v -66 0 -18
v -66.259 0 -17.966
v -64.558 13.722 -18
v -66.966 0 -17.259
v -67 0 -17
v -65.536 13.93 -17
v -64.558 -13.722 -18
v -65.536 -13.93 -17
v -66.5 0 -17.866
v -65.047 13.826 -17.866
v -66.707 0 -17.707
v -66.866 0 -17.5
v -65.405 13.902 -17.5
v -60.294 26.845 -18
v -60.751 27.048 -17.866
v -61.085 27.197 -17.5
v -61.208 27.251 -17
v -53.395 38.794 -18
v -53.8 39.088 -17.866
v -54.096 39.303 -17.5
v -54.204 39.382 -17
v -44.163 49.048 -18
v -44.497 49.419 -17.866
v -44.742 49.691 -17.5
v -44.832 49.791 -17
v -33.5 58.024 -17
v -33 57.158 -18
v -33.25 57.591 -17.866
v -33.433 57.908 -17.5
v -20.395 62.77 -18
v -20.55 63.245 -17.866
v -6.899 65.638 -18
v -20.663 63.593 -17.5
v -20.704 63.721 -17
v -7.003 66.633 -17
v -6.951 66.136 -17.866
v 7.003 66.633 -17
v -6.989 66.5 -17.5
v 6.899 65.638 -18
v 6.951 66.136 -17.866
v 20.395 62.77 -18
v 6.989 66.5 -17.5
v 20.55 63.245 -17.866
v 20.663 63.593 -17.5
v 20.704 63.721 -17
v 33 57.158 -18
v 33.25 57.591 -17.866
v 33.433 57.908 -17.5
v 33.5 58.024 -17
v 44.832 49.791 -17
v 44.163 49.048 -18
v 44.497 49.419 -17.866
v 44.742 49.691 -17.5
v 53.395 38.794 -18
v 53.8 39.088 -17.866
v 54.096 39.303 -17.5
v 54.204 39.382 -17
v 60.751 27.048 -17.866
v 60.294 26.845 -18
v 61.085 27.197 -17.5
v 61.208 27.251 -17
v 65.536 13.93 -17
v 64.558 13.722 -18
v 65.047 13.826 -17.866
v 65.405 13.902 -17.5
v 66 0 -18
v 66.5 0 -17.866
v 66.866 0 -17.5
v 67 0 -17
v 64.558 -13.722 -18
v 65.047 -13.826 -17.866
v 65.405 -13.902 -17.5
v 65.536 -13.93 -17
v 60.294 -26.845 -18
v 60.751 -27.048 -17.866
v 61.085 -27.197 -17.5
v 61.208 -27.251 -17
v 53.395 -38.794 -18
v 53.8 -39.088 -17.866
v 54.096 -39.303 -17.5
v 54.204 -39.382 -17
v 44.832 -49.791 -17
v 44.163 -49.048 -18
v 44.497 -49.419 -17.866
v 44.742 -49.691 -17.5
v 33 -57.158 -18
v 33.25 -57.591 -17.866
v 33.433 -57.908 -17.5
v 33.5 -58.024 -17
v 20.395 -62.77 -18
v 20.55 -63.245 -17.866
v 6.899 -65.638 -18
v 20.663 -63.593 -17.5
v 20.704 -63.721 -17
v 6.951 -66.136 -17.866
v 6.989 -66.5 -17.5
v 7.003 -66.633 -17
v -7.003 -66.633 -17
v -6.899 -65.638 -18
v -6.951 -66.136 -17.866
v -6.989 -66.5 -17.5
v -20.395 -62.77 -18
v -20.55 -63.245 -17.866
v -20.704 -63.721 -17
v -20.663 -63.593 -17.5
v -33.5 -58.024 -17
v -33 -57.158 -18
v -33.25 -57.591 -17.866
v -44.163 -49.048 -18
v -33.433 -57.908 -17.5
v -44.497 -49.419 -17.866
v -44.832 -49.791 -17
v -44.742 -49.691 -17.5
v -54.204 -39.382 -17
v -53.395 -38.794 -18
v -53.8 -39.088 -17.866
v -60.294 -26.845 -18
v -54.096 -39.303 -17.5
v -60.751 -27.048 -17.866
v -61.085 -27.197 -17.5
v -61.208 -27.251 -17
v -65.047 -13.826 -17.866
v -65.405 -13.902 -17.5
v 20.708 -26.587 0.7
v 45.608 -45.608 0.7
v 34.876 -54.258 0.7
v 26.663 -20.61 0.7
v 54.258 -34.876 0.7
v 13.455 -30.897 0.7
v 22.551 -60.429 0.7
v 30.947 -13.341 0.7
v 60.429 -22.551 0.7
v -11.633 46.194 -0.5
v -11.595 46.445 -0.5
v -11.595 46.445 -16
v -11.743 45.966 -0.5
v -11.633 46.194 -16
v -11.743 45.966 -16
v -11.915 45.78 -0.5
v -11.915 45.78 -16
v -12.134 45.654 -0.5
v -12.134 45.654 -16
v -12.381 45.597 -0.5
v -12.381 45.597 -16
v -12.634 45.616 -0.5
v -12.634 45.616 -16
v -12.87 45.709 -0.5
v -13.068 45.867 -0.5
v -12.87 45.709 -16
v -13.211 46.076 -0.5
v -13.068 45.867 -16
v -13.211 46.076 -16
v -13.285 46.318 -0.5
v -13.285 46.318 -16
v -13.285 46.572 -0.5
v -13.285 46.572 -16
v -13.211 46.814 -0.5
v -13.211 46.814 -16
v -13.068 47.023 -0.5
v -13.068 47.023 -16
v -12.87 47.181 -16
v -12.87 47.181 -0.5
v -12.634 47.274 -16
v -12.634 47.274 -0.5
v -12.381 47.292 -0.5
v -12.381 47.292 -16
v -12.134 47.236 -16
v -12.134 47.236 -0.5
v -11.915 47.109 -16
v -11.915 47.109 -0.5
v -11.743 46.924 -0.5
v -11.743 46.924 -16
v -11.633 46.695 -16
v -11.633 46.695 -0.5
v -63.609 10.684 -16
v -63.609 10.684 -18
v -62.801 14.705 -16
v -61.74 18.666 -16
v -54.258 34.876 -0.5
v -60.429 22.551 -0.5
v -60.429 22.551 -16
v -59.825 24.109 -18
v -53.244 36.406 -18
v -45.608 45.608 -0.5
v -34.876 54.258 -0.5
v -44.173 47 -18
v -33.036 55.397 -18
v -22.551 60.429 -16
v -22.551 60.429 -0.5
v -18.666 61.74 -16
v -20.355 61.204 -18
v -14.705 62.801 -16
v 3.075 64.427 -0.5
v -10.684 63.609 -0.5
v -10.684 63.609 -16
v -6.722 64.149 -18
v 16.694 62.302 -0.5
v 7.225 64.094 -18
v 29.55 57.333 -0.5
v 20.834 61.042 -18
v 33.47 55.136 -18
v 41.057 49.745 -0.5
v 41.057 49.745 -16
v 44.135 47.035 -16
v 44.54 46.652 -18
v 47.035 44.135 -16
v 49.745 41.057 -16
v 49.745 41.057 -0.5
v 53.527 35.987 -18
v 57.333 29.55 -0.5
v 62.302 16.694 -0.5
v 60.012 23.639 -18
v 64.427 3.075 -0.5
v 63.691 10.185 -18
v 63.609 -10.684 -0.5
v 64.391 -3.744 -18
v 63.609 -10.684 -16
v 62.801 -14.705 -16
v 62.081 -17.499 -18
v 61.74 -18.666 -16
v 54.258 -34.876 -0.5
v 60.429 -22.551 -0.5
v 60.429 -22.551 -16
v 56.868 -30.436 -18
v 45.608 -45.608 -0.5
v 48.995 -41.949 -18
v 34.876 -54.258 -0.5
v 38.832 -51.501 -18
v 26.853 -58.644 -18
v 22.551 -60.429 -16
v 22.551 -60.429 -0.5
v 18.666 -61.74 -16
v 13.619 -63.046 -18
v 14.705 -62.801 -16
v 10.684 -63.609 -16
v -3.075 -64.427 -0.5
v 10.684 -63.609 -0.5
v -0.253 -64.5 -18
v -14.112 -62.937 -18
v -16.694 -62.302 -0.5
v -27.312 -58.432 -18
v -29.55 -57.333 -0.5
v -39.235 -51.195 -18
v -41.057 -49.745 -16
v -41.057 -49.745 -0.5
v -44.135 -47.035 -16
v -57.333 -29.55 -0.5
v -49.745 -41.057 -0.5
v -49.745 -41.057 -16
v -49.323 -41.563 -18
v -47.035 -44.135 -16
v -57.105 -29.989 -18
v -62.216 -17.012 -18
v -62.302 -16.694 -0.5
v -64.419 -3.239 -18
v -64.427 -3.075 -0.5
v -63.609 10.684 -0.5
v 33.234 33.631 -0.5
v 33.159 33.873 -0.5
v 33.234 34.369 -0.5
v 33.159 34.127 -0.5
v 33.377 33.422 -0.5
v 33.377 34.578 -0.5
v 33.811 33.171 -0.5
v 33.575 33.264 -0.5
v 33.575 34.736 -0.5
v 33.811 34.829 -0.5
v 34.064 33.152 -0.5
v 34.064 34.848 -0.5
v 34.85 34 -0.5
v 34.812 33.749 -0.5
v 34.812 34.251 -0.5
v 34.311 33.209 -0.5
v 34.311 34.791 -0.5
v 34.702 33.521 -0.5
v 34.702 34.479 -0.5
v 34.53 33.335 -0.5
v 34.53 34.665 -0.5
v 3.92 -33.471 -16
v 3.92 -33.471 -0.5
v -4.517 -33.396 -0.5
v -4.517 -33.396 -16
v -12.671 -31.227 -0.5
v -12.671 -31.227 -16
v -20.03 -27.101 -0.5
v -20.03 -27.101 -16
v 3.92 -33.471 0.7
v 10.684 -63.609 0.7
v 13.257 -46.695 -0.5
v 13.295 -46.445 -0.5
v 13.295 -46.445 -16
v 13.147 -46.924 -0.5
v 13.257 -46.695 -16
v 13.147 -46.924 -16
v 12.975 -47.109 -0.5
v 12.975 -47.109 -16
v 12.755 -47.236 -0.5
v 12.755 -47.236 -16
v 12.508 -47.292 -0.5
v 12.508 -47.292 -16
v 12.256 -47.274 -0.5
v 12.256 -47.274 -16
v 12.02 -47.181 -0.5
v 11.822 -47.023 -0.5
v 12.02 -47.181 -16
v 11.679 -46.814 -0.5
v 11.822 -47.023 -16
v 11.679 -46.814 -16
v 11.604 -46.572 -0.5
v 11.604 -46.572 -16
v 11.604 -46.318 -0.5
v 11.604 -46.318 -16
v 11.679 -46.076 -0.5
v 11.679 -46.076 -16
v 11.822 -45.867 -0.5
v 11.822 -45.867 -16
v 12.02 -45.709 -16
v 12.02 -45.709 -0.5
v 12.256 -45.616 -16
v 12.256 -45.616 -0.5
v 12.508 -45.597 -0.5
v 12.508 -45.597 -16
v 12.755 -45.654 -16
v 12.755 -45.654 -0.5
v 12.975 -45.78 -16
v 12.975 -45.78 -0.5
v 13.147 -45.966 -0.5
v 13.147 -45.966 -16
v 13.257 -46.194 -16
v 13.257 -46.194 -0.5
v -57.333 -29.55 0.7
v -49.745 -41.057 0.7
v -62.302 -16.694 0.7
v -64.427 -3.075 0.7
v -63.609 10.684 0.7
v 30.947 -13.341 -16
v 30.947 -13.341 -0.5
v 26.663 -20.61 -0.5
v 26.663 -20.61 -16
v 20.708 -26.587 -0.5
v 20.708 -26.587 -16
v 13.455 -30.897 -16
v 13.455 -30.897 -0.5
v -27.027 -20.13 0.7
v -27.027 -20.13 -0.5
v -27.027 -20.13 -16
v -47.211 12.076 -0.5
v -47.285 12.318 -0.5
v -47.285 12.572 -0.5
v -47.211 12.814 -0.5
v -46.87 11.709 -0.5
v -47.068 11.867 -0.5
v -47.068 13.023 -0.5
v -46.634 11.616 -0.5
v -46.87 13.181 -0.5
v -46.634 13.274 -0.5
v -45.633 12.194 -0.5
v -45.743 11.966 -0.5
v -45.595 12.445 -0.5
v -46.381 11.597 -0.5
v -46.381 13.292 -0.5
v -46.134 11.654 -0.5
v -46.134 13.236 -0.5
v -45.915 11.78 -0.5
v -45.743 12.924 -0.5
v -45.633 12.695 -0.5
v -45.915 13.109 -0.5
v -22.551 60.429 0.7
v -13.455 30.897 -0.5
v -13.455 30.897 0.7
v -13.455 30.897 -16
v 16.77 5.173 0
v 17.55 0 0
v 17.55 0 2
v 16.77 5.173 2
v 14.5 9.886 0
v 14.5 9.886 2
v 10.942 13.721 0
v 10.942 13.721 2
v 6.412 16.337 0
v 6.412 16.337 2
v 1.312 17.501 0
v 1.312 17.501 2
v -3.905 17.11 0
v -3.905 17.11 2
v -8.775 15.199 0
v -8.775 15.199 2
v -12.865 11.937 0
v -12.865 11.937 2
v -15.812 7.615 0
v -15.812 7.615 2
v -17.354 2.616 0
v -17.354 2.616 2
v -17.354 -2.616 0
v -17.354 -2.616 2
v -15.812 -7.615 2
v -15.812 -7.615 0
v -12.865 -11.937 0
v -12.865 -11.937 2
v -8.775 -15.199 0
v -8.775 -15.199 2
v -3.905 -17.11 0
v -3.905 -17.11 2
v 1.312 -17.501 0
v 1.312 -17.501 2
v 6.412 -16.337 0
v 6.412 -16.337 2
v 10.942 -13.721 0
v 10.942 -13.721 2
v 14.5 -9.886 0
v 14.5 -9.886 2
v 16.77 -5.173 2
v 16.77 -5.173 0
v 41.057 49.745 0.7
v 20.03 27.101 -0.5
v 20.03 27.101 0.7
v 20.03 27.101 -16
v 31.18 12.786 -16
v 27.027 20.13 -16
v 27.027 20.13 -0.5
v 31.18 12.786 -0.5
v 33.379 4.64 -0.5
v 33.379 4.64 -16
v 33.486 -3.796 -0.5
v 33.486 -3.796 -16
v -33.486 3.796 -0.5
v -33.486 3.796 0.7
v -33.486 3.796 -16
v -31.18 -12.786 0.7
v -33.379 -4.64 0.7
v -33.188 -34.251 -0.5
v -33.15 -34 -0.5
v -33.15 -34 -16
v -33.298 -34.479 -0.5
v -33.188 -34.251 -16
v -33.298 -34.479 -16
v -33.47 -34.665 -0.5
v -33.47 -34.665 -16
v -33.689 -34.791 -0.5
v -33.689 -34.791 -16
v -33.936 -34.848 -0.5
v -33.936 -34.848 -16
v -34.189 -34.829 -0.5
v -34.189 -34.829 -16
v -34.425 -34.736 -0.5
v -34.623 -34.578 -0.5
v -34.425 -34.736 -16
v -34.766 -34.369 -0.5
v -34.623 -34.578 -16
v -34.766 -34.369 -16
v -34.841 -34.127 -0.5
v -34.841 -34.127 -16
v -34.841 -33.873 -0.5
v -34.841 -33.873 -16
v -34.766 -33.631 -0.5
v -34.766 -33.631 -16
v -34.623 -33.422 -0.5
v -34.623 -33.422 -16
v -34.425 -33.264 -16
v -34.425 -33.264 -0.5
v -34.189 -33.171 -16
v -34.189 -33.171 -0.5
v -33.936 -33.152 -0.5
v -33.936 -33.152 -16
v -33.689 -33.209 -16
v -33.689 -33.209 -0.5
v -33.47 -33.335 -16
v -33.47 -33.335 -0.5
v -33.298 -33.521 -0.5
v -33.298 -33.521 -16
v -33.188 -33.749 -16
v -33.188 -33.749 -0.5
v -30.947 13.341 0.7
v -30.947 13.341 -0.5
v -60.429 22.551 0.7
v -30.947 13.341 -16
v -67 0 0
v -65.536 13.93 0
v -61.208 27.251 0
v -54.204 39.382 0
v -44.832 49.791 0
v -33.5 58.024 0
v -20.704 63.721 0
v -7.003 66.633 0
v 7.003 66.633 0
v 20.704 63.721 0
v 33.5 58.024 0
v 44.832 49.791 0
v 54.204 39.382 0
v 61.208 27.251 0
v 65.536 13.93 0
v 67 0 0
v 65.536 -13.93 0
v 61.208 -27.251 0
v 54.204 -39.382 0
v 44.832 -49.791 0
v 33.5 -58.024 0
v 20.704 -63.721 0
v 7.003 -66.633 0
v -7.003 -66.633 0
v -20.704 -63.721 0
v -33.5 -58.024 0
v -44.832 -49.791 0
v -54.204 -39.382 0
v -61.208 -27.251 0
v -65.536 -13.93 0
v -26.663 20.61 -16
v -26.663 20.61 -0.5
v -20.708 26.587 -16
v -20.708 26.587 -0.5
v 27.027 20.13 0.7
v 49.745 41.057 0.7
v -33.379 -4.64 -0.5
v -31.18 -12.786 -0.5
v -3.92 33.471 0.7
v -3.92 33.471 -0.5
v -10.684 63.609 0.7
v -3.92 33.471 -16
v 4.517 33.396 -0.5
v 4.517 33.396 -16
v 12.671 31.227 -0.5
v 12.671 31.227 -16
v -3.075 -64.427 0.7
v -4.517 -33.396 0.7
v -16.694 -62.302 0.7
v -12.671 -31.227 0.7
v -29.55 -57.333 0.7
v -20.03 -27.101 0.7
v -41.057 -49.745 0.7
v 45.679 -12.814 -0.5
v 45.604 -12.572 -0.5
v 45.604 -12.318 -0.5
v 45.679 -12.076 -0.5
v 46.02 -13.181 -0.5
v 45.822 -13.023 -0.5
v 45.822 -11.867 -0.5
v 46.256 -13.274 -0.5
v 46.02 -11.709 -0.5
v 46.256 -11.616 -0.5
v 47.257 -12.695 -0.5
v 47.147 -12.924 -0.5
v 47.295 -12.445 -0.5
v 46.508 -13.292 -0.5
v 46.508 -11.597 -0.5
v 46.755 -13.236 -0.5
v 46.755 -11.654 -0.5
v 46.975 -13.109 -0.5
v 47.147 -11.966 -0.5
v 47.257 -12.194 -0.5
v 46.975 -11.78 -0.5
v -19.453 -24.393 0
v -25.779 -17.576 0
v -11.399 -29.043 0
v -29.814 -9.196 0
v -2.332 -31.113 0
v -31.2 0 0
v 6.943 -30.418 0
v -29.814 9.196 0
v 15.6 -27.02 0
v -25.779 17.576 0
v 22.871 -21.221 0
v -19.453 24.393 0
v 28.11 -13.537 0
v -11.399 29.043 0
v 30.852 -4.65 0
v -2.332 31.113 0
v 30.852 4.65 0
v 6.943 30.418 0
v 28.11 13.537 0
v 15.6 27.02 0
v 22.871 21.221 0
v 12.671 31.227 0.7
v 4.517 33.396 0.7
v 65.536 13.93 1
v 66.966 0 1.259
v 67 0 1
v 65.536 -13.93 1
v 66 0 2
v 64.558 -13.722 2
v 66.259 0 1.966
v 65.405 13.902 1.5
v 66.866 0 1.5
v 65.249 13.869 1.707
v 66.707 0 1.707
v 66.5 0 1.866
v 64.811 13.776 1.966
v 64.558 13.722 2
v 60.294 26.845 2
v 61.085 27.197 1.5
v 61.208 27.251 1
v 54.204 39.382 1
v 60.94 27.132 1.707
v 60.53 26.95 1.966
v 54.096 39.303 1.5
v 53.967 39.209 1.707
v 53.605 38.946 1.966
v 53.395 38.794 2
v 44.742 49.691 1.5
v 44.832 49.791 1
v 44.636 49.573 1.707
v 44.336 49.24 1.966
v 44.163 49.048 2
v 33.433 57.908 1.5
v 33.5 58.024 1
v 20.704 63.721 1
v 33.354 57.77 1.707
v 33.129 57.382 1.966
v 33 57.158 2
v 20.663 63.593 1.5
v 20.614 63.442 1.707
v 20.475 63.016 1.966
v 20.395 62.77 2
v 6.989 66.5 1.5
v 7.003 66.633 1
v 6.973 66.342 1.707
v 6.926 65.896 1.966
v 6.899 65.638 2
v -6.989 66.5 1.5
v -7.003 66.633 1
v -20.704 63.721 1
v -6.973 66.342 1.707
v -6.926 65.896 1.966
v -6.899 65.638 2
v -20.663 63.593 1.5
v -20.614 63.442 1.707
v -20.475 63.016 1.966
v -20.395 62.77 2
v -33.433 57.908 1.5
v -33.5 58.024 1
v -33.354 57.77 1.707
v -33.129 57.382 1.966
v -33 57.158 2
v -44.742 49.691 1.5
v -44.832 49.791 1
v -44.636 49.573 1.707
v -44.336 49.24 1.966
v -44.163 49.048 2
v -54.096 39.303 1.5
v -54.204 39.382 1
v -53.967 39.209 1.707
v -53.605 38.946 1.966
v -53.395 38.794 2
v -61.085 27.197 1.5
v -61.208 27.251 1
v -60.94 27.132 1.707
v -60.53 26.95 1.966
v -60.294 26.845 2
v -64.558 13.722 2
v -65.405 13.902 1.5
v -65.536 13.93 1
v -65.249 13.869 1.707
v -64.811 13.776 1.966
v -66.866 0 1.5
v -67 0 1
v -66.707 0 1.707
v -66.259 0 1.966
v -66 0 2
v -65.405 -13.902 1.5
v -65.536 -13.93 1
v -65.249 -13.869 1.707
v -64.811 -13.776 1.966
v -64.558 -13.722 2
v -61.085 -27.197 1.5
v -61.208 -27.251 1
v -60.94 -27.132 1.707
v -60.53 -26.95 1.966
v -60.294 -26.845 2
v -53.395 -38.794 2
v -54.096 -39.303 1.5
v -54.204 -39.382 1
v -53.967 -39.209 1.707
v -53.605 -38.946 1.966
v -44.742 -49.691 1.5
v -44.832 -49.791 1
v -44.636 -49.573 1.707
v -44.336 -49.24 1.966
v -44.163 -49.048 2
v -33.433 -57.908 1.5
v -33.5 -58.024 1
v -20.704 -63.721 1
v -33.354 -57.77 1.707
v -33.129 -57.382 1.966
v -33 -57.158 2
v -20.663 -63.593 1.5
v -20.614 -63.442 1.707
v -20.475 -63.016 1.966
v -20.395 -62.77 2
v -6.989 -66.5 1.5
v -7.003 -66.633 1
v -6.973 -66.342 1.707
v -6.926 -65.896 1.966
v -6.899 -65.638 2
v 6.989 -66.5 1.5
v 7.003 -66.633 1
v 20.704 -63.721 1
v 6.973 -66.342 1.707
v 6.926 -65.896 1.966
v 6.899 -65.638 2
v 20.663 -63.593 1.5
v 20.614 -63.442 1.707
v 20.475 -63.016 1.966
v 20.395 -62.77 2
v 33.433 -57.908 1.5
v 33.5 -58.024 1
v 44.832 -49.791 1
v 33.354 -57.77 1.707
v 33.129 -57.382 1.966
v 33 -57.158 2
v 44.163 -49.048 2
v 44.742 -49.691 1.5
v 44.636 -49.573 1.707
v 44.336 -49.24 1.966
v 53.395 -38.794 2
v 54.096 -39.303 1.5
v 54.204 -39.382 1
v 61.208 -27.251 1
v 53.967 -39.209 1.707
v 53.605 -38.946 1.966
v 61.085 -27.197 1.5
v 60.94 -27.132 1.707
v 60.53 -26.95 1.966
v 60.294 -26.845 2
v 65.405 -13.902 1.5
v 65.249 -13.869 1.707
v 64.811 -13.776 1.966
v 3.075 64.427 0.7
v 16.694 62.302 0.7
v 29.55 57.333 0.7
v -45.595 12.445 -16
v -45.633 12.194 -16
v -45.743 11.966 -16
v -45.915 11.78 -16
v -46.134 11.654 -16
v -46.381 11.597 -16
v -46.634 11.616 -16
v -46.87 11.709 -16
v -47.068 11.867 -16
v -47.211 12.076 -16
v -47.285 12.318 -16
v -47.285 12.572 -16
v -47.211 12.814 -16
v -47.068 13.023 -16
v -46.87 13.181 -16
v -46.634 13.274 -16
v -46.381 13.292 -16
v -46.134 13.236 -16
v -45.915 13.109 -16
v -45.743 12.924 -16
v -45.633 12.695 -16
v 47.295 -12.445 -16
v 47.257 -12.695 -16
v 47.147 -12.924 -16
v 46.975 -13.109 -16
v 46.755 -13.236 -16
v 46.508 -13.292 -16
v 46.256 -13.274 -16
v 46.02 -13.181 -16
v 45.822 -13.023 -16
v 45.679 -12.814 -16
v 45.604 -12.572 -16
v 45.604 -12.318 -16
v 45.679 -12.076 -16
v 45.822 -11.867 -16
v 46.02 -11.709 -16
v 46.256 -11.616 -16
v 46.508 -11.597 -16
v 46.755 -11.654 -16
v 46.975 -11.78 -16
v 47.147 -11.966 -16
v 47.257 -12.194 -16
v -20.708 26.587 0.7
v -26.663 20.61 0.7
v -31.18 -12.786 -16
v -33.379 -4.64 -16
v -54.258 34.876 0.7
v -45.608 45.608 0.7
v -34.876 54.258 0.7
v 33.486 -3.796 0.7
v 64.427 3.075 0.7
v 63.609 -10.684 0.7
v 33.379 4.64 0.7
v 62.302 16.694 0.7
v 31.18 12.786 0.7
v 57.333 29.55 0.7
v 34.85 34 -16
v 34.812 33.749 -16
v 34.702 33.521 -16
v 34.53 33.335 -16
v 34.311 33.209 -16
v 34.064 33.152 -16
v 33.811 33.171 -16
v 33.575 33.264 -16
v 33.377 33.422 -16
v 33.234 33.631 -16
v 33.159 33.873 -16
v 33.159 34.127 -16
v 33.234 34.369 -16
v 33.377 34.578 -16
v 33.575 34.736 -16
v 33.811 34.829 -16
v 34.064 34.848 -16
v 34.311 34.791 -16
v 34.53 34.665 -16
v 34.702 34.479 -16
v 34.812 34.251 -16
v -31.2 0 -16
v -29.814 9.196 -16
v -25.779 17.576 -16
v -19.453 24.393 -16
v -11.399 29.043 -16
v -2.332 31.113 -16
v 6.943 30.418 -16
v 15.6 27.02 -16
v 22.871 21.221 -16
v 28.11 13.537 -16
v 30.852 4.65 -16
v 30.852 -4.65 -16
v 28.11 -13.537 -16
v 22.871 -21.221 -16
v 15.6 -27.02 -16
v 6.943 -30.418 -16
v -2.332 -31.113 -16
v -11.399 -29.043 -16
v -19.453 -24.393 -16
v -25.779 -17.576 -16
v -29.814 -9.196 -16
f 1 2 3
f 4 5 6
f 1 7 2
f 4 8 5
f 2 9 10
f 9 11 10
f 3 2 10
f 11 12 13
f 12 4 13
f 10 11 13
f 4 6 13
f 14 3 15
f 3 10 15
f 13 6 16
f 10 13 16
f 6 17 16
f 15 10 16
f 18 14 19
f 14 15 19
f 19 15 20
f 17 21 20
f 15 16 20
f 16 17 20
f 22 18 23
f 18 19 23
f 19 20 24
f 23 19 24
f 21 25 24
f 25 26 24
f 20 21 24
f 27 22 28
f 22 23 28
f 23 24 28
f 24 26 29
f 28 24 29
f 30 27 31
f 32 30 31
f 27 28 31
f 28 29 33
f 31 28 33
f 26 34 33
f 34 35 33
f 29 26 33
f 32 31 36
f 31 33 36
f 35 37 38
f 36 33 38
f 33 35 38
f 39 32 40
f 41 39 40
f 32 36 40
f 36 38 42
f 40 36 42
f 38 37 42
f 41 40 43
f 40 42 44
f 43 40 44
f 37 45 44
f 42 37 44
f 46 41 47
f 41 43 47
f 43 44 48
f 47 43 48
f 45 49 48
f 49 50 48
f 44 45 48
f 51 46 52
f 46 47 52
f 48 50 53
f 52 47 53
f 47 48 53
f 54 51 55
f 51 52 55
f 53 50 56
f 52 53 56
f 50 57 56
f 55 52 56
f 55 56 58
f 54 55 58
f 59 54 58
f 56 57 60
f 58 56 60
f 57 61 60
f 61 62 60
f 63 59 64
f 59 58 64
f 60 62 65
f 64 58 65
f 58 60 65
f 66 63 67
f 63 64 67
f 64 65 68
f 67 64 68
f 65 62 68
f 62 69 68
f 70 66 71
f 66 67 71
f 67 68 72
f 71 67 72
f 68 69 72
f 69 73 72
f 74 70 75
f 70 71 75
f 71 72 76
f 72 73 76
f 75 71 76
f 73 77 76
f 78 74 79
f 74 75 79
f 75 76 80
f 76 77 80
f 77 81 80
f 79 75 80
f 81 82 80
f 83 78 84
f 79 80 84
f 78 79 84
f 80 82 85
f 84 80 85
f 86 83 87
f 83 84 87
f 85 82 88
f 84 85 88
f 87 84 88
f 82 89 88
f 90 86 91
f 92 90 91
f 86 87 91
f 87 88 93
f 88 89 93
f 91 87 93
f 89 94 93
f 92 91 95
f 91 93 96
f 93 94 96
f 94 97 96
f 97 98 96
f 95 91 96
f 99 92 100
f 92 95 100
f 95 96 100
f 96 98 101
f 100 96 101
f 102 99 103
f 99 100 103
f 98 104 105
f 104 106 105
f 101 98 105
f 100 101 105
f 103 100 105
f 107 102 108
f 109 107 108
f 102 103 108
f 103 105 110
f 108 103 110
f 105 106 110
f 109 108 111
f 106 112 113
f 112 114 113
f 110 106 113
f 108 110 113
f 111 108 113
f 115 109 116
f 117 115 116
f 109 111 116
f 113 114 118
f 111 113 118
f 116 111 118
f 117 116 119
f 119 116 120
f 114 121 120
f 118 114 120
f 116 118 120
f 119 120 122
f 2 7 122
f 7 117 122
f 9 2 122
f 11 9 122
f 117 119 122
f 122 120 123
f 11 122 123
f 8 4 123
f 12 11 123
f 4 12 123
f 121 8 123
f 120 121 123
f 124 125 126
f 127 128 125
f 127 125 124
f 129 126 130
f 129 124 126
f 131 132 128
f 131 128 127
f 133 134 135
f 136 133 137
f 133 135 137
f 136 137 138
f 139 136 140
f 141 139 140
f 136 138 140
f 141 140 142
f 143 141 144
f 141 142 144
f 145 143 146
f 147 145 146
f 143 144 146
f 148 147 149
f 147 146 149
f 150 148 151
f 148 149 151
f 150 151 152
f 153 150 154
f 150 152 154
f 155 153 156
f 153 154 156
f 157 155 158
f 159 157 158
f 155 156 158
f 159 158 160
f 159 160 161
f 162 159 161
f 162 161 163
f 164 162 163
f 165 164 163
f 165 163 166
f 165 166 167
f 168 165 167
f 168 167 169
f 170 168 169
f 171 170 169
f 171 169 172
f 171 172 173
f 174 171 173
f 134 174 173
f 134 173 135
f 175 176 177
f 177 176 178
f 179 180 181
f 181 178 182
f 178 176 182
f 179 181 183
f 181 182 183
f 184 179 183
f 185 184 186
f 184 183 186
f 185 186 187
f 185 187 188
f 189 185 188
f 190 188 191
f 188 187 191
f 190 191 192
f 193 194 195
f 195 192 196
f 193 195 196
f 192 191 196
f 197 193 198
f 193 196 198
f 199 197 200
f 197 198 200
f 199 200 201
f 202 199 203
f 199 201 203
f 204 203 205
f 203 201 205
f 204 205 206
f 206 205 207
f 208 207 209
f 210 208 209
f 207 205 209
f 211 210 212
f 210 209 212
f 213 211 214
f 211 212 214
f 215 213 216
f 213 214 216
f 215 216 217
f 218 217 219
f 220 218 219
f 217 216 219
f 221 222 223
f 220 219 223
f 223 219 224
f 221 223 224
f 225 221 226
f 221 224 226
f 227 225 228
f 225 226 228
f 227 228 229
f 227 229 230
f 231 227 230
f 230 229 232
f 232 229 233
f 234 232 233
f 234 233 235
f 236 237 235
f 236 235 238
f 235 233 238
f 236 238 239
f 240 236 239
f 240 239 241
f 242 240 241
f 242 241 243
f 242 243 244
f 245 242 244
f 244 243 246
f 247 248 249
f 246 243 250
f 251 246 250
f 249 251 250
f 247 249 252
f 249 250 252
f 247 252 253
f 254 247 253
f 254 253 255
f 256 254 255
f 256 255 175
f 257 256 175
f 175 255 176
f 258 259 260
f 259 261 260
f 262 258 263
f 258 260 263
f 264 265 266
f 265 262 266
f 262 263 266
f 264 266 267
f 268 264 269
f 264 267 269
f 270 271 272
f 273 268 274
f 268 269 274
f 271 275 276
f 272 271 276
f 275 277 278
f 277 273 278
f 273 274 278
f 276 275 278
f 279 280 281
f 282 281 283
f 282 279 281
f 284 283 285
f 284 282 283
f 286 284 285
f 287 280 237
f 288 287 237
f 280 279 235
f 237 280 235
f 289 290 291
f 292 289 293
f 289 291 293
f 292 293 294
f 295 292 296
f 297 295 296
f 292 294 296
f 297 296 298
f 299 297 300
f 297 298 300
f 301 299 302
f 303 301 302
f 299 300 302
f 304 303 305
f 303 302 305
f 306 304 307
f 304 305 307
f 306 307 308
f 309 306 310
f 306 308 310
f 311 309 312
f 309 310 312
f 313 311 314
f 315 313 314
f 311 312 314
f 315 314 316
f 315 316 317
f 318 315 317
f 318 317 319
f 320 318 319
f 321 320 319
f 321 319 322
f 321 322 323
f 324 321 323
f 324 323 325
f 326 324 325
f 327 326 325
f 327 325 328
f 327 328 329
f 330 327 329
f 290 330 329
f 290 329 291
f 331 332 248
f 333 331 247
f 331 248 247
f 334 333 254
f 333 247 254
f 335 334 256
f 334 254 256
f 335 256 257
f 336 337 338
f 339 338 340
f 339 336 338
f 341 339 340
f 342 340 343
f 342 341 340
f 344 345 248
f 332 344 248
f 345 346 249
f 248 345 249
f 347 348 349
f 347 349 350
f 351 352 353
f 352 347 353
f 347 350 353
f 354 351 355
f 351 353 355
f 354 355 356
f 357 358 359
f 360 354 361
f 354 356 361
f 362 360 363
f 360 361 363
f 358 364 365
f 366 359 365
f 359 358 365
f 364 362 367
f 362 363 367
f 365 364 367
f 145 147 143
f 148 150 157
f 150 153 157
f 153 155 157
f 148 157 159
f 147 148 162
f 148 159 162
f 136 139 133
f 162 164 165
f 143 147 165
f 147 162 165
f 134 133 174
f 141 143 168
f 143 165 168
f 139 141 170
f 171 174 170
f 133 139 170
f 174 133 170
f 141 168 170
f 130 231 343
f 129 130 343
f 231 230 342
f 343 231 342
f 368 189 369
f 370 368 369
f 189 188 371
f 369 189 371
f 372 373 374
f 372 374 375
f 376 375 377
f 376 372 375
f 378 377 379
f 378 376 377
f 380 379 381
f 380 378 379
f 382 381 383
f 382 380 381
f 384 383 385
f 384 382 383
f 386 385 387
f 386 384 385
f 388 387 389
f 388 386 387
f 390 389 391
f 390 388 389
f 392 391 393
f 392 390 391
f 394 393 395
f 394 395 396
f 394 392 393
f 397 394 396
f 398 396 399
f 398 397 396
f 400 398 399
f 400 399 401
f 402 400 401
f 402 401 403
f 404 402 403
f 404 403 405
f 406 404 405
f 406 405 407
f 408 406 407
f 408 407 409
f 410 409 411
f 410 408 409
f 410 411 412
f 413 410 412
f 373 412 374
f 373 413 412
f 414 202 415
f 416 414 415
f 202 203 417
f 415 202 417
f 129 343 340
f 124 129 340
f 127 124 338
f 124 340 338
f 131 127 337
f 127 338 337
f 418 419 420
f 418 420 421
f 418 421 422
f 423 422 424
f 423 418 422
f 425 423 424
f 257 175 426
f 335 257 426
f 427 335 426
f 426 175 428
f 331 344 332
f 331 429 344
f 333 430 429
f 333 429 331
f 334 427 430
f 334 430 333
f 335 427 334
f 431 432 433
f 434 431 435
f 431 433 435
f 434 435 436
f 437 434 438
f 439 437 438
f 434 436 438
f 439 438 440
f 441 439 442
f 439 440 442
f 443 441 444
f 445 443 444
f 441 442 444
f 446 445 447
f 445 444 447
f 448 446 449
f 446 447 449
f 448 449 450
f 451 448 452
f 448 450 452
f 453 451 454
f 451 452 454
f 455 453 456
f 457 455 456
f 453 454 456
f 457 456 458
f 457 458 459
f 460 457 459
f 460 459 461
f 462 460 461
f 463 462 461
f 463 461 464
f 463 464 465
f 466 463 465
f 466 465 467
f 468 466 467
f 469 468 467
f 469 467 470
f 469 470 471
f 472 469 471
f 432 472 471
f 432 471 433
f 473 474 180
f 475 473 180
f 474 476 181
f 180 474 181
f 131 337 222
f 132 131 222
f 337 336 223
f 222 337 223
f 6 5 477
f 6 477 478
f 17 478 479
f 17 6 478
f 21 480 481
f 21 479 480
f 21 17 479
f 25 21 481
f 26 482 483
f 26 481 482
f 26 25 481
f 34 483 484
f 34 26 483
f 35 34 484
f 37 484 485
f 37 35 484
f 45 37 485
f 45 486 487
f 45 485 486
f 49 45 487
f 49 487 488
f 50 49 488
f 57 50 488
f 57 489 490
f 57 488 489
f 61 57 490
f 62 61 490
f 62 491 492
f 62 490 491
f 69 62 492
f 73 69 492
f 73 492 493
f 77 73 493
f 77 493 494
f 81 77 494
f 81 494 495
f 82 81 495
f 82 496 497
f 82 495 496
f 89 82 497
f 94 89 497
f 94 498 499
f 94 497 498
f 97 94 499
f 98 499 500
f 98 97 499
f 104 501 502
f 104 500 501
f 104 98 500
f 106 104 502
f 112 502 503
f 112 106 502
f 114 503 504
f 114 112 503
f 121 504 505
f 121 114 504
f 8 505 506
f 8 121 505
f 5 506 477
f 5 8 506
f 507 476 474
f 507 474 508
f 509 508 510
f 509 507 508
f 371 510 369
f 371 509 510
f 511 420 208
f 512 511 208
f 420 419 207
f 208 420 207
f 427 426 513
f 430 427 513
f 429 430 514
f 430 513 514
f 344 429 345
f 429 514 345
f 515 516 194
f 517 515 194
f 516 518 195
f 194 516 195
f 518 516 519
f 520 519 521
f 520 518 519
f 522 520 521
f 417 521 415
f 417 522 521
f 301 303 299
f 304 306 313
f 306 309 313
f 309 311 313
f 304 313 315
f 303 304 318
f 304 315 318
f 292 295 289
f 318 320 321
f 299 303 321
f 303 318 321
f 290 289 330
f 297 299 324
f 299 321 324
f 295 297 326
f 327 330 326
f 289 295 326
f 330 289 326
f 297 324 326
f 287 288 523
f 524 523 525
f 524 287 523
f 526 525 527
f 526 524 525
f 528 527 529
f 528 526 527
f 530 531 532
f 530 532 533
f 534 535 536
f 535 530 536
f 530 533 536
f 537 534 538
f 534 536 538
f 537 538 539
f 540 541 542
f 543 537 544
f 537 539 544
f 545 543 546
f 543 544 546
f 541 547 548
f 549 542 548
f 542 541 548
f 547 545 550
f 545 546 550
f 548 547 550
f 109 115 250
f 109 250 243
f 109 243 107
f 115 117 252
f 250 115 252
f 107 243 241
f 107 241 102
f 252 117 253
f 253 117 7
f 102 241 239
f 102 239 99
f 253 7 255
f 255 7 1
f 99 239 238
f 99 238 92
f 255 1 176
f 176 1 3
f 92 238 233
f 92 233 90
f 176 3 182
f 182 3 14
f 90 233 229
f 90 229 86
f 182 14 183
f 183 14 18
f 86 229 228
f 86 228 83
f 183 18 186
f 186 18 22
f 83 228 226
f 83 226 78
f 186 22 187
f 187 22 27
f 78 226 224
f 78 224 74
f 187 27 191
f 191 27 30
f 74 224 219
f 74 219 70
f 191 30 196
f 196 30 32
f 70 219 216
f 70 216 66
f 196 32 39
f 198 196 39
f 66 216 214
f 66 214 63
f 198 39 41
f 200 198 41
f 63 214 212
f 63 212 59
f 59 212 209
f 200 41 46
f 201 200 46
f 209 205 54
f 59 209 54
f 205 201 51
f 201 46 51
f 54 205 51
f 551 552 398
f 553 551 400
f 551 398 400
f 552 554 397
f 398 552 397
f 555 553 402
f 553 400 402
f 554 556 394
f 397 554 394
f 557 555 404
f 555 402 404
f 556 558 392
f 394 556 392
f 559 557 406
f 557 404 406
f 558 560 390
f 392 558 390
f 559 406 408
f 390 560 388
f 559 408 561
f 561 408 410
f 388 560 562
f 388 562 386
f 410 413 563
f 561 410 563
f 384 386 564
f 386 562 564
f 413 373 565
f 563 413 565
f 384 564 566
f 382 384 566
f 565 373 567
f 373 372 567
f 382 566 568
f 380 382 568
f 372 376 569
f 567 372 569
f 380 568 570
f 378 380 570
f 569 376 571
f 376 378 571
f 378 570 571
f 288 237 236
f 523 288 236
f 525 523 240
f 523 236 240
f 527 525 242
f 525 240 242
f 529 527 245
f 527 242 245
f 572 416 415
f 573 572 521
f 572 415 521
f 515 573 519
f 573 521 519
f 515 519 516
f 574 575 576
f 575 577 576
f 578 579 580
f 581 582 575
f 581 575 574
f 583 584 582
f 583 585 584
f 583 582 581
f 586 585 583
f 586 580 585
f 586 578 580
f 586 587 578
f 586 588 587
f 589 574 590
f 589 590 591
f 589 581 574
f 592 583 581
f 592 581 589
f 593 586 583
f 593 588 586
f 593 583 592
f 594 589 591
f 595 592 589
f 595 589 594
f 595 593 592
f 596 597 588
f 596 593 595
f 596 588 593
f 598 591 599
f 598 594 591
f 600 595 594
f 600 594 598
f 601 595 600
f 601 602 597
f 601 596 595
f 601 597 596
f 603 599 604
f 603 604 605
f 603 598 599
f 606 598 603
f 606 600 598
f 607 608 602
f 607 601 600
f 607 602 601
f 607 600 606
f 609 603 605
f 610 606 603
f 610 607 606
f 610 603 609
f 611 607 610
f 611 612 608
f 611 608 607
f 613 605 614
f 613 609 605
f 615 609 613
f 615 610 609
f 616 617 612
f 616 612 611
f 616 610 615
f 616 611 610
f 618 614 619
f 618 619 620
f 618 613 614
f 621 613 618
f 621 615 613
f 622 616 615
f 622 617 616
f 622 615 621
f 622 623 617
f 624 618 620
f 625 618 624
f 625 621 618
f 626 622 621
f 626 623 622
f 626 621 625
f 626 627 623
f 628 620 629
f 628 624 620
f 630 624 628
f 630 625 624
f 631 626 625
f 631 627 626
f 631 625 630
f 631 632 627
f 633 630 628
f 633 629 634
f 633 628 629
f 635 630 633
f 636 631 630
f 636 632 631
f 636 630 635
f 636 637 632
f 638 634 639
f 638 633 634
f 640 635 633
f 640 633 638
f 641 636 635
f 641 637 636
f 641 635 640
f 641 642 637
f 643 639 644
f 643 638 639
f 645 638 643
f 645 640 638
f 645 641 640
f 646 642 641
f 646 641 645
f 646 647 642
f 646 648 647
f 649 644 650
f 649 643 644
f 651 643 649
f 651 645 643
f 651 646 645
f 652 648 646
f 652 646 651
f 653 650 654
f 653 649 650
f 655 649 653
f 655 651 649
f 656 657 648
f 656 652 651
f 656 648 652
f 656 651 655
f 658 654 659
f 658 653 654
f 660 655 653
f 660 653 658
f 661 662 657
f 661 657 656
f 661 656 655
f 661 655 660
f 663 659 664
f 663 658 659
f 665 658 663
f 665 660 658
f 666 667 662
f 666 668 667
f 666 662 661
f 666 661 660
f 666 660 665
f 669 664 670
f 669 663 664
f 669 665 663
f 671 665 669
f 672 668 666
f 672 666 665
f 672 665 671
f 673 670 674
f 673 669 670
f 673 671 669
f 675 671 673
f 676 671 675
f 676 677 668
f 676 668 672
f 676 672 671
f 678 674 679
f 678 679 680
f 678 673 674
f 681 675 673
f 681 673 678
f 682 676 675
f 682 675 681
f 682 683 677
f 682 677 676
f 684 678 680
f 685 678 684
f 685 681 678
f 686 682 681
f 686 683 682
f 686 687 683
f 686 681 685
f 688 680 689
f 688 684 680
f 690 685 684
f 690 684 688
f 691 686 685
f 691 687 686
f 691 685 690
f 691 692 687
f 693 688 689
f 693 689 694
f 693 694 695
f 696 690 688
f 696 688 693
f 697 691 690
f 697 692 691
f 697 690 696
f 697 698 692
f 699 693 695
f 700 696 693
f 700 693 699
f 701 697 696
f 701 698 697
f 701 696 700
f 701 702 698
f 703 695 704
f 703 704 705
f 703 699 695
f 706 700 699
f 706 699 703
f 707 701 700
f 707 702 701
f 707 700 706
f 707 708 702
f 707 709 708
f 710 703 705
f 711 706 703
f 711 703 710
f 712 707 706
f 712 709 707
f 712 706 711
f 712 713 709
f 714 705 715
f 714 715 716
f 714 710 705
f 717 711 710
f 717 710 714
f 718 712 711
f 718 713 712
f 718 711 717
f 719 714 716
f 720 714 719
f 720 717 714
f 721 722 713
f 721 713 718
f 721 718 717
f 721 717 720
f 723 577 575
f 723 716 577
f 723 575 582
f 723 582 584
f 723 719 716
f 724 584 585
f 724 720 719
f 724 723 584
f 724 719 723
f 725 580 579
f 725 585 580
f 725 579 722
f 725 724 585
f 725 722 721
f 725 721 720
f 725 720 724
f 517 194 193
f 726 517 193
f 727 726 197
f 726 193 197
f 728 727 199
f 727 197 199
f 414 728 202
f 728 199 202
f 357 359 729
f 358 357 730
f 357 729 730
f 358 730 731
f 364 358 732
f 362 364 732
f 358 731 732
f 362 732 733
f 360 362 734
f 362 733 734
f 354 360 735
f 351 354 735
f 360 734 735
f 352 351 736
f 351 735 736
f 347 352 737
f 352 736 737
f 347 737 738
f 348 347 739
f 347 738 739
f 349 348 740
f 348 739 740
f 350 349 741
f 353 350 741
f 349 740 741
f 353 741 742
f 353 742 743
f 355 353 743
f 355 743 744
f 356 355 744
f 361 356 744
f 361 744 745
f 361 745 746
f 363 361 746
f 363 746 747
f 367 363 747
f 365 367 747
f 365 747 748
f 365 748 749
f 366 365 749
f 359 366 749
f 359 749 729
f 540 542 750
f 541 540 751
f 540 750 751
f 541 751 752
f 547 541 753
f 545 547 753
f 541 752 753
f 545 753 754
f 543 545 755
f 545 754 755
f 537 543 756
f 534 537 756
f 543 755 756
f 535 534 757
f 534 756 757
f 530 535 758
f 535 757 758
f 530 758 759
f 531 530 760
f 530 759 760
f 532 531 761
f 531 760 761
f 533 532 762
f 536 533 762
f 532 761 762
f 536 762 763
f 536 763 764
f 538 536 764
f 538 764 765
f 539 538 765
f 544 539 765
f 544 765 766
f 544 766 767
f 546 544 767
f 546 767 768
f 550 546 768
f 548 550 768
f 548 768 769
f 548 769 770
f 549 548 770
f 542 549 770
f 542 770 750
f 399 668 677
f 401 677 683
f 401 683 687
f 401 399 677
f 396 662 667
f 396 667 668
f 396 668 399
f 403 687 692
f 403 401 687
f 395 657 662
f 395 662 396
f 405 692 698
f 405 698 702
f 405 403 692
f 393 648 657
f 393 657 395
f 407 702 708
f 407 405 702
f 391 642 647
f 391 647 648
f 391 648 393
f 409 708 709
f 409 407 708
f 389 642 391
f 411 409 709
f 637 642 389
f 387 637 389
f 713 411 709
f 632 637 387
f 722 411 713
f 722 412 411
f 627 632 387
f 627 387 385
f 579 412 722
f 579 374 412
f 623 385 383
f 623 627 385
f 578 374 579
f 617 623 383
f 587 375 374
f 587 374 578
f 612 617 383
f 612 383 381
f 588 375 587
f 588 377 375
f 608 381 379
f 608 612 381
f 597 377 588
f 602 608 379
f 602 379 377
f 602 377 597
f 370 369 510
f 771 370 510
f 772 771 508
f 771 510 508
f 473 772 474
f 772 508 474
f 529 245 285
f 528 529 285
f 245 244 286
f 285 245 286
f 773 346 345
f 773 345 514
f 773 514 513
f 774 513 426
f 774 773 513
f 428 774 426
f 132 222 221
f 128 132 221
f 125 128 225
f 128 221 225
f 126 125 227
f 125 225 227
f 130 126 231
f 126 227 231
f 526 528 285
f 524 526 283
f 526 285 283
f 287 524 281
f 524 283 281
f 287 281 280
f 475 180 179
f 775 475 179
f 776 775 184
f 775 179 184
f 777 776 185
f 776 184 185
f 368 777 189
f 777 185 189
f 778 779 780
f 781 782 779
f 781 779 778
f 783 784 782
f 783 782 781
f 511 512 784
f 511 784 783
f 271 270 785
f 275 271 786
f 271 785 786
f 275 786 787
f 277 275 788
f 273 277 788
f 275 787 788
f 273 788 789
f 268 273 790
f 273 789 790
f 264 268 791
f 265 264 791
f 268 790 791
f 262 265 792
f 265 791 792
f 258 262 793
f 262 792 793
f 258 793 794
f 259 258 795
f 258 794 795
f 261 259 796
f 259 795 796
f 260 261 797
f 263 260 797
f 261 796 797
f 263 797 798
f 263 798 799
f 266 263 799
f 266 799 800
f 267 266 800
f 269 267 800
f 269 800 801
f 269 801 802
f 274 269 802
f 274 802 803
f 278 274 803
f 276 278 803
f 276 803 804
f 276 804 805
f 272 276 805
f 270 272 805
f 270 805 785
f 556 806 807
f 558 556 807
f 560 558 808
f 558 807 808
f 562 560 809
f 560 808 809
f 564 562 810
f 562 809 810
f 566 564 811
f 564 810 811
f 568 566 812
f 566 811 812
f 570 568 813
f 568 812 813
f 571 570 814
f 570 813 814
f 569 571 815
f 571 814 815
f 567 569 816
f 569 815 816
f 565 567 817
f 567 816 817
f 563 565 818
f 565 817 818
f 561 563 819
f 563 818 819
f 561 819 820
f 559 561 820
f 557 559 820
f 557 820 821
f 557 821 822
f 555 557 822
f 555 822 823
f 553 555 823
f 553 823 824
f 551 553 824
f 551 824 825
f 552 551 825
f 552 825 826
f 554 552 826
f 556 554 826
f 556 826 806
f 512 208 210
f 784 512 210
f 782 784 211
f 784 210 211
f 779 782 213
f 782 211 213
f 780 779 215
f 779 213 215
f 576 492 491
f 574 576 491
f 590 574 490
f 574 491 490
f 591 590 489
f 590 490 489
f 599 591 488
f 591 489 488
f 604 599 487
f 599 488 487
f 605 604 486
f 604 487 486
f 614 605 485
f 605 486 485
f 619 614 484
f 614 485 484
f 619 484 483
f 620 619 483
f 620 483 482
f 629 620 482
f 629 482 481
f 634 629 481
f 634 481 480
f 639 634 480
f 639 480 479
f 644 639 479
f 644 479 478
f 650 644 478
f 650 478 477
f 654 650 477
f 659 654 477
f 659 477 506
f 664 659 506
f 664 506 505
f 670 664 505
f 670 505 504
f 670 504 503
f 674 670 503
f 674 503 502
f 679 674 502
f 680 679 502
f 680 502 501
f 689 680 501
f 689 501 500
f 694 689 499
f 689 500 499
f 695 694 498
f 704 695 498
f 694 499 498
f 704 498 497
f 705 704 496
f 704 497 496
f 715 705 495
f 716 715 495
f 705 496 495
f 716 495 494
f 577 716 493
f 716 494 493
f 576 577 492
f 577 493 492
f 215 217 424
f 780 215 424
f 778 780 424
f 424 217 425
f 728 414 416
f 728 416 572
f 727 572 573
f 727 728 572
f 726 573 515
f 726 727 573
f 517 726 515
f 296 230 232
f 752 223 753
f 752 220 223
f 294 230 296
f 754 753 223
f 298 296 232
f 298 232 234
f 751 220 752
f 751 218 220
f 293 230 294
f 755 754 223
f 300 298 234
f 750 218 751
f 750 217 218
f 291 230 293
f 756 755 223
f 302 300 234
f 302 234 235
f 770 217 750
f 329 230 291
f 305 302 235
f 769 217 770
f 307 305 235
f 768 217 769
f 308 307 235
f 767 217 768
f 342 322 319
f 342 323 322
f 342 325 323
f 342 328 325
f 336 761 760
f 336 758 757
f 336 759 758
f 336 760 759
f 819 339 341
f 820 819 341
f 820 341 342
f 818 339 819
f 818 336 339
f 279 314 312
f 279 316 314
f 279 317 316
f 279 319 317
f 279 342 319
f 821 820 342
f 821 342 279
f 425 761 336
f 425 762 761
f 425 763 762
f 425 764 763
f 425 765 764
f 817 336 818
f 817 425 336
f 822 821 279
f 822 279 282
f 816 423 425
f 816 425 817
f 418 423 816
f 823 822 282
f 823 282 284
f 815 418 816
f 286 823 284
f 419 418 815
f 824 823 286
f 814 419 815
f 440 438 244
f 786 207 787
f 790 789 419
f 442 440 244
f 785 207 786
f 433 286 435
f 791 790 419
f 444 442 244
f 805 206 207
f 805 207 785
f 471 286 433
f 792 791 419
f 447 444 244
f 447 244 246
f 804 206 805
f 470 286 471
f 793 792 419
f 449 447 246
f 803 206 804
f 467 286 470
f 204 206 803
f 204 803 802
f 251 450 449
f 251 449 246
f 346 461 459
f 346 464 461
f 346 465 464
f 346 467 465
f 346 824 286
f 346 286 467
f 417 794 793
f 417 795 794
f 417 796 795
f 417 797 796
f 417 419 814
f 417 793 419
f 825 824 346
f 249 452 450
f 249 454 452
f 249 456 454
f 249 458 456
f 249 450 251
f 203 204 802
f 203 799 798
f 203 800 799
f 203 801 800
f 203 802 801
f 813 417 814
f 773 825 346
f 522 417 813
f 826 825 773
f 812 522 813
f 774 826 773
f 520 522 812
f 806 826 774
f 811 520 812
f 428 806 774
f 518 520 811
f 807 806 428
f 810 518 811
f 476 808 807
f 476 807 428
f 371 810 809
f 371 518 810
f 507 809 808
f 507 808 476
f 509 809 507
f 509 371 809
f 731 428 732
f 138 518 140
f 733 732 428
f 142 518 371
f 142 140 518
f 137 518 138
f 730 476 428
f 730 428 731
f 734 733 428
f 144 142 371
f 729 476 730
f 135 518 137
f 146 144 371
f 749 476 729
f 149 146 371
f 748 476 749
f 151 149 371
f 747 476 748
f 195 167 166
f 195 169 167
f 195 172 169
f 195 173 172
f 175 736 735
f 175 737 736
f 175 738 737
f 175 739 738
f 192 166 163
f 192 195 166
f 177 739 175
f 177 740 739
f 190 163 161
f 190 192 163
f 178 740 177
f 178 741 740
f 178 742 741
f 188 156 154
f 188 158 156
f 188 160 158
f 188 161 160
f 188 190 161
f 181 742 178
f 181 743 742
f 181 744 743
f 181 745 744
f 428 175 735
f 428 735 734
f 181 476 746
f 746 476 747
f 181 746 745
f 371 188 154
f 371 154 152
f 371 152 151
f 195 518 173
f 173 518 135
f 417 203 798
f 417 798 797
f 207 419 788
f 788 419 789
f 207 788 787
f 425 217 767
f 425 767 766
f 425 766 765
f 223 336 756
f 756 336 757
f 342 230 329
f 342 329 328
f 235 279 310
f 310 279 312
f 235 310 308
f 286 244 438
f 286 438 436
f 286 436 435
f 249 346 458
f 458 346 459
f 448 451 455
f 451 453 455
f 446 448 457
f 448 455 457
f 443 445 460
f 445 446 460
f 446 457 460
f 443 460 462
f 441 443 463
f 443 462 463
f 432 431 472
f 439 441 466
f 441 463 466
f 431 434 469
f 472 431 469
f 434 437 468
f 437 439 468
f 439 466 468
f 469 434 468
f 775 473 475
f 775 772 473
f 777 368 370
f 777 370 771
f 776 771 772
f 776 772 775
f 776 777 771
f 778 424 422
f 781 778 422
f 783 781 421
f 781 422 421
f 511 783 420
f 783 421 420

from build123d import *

# Parameters (mm, degrees)
SKETCH_1_R          = 67
SKETCH_1_R_2        = 17.55
EXTRUDE_1_DEPTH     = 2
EXTRUDE_START       = 18
SKETCH_2_R          = 67
SKETCH_2_R_2        = 31.2
EXTRUDE_2_DEPTH     = 18
FILLET_1_R          = 1
SHELL_4_T           = -2.5
SKETCH_4_R          = 0.85
EXTRUDE_3_DEPTH     = 18
FILLET_2_R          = 1
CUT_EXTRUDE_1_DEPTH = 1.2
SKETCH_6_R          = 64.5
CUT_EXTRUDE_2_DEPTH = 2


with BuildPart() as part:
    # 草图1 → 凸台-拉伸1 (new body)
    with BuildSketch(Plane.XY):
        Circle(SKETCH_1_R)
        Circle(SKETCH_1_R_2, mode=Mode.SUBTRACT)
    extrude(amount=EXTRUDE_1_DEPTH)

    # 草图2 → 凸台-拉伸2 (add)
    with BuildSketch(Plane(origin=(0, 0, 0), x_dir=(-1, 0, 0), z_dir=(0, 0, -1)).offset(EXTRUDE_START)):
        Circle(SKETCH_2_R)
        Circle(SKETCH_2_R_2, mode=Mode.SUBTRACT)
    extrude(amount=-EXTRUDE_2_DEPTH)

    # 圆角1
    fillet_1_edges = [part.edges().sort_by_distance(p)[0] for p in [
        (-67, 0, 2),
    ]]
    fillet(fillet_1_edges, radius=FILLET_1_R)

    # 抽壳4
    shell_4_openings = [part.faces().sort_by_distance(p)[0] for p in [
        (65.104953826, 0, -18),
    ]]
    offset(amount=SHELL_4_T, openings=shell_4_openings, kind=Kind.INTERSECTION)

    # 草图4 → 凸台-拉伸3 (add)
    # profile 1 of 6: a face of its own
    with BuildSketch(Plane(origin=(0, 0, 0), x_dir=(-1, 0, 0), z_dir=(0, 0, -1)).offset(EXTRUDE_START)):
        with BuildLine():
            Line((-41.05741952, 49.744731403), (-20.030225152, 27.101292964))
            ThreePointArc((-20.030225152, 27.101292964), (-23.785423834, 23.873491848), (-27.027081181, 20.130247958))
            Line((-27.027081181, 20.130247958), (-49.744731403, 41.05741952))
            ThreePointArc((-49.744731403, 41.05741952), (-45.608387387, 45.608387387), (-41.05741952, 49.744731403))
        make_face()
        with Locations(Location((-34, 34, 0), (0, 0, 180))):
            Circle(SKETCH_4_R, mode=Mode.SUBTRACT)
    # profile 2 of 6: a face of its own
    with BuildSketch(Plane(origin=(0, 0, 0), x_dir=(-1, 0, 0), z_dir=(0, 0, -1)).offset(EXTRUDE_START)):
        with BuildLine():
            Line((22.55149134, 60.42913402), (13.455295606, 30.897330308))
            ThreePointArc((13.455295606, 30.897330308), (8.782338501, 32.535527204), (3.919765525, 33.471262872))
            Line((3.919765525, 33.471262872), (10.684402617, 63.608910859))
            ThreePointArc((10.684402617, 63.608910859), (16.693828409, 62.302215796), (22.55149134, 60.42913402))
        make_face()
        with Locations(Location((12.444863729, 46.444863729, 0), (0, 0, 180))):
            Circle(SKETCH_4_R, mode=Mode.SUBTRACT)
    # profile 3 of 6: a face of its own
    with BuildSketch(Plane(origin=(0, 0, 0), x_dir=(-1, 0, 0), z_dir=(0, 0, -1)).offset(EXTRUDE_START)):
        with BuildLine():
            Line((63.608910859, 10.684402617), (33.485520759, 3.796037343))
            ThreePointArc((33.485520759, 3.796037343), (32.567762335, 8.662035356), (30.946846706, 13.341014914))
            Line((30.946846706, 13.341014914), (60.42913402, 22.55149134))
            ThreePointArc((60.42913402, 22.55149134), (62.302215796, 16.693828409), (63.608910859, 10.684402617))
        make_face()
        with Locations(Location((46.444863729, 12.444863729, 0), (0, 0, 180))):
            Circle(SKETCH_4_R, mode=Mode.SUBTRACT)
    # profile 4 of 6: a face of its own
    with BuildSketch(Plane(origin=(0, 0, 0), x_dir=(-1, 0, 0), z_dir=(0, 0, -1)).offset(EXTRUDE_START)):
        with BuildLine():
            Line((41.05741952, -49.744731403), (20.030225152, -27.101292964))
            ThreePointArc((20.030225152, -27.101292964), (23.785423834, -23.873491848), (27.027081181, -20.130247958))
            Line((27.027081181, -20.130247958), (49.744731403, -41.05741952))
            ThreePointArc((49.744731403, -41.05741952), (45.608387387, -45.608387387), (41.05741952, -49.744731403))
        make_face()
        with Locations(Location((34, -34, 0), (0, 0, 180))):
            Circle(SKETCH_4_R, mode=Mode.SUBTRACT)
    # profile 5 of 6: a face of its own
    with BuildSketch(Plane(origin=(0, 0, 0), x_dir=(-1, 0, 0), z_dir=(0, 0, -1)).offset(EXTRUDE_START)):
        with BuildLine():
            Line((-22.55149134, -60.42913402), (-13.455295606, -30.897330308))
            ThreePointArc((-13.455295606, -30.897330308), (-8.782338501, -32.535527204), (-3.919765525, -33.471262872))
            Line((-3.919765525, -33.471262872), (-10.684402617, -63.608910859))
            ThreePointArc((-10.684402617, -63.608910859), (-16.693828409, -62.302215796), (-22.55149134, -60.42913402))
        make_face()
        with Locations(Location((-12.444863729, -46.444863729, 0), (0, 0, 180))):
            Circle(SKETCH_4_R, mode=Mode.SUBTRACT)
    # profile 6 of 6: a face of its own
    with BuildSketch(Plane(origin=(0, 0, 0), x_dir=(-1, 0, 0), z_dir=(0, 0, -1)).offset(EXTRUDE_START)):
        with BuildLine():
            Line((-63.608910859, -10.684402617), (-33.485520759, -3.796037343))
            ThreePointArc((-33.485520759, -3.796037343), (-32.567762335, -8.662035356), (-30.946846706, -13.341014914))
            Line((-30.946846706, -13.341014914), (-60.42913402, -22.55149134))
            ThreePointArc((-60.42913402, -22.55149134), (-62.302215796, -16.693828409), (-63.608910859, -10.684402617))
        make_face()
        with Locations(Location((-46.444863729, -12.444863729, 0), (0, 0, 180))):
            Circle(SKETCH_4_R, mode=Mode.SUBTRACT)
    extrude(amount=-EXTRUDE_3_DEPTH)

    # 圆角2
    fillet_2_edges = [part.edges().sort_by_distance(p)[0] for p in [
        (67, 0, -18),
    ]]
    fillet(fillet_2_edges, radius=FILLET_2_R)

    # 草图5 → 切除-拉伸1 (cut)
    with BuildSketch(Plane(origin=(0, 0, -0.5), x_dir=(-1, 0, 0), z_dir=(0, 0, -1))):
        with BuildLine():
            Line((-63.608910859, -10.684402617), (-33.485520759, -3.796037343))
            ThreePointArc((-33.485520759, -3.796037343), (-32.535527204, 8.782338501), (-27.027081181, 20.130247958))
            Line((-27.027081181, 20.130247958), (-49.744731403, 41.05741952))
            ThreePointArc((-49.744731403, 41.05741952), (-62.302215796, 16.693828409), (-63.608910859, -10.684402617))
        make_face()
        with BuildLine():
            Line((-41.05741952, 49.744731403), (-20.030225152, 27.101292964))
            ThreePointArc((-20.030225152, 27.101292964), (-8.662035356, 32.567762335), (3.919765525, 33.471262872))
            Line((3.919765525, 33.471262872), (10.684402617, 63.608910859))
            ThreePointArc((10.684402617, 63.608910859), (-16.693828409, 62.302215796), (-41.05741952, 49.744731403))
        make_face()
        with BuildLine():
            Line((30.946846706, 13.341014914), (60.42913402, 22.55149134))
            ThreePointArc((60.42913402, 22.55149134), (45.608387387, 45.608387387), (22.55149134, 60.42913402))
            Line((22.55149134, 60.42913402), (13.455295606, 30.897330308))
            ThreePointArc((13.455295606, 30.897330308), (23.873491848, 23.785423834), (30.946846706, 13.341014914))
        make_face()
        with BuildLine():
            Line((27.027081181, -20.130247958), (49.744731403, -41.05741952))
            ThreePointArc((49.744731403, -41.05741952), (62.302215796, -16.693828409), (63.608910859, 10.684402617))
            Line((63.608910859, 10.684402617), (33.485520759, 3.796037343))
            ThreePointArc((33.485520759, 3.796037343), (32.535527204, -8.782338501), (27.027081181, -20.130247958))
        make_face()
        with BuildLine():
            Line((-3.919765525, -33.471262872), (-10.684402617, -63.608910859))
            ThreePointArc((-10.684402617, -63.608910859), (16.693828409, -62.302215796), (41.05741952, -49.744731403))
            Line((41.05741952, -49.744731403), (20.030225152, -27.101292964))
            ThreePointArc((20.030225152, -27.101292964), (8.662035356, -32.567762335), (-3.919765525, -33.471262872))
        make_face()
        with BuildLine():
            Line((-30.946846706, -13.341014914), (-60.42913402, -22.55149134))
            ThreePointArc((-60.42913402, -22.55149134), (-45.608387387, -45.608387387), (-22.55149134, -60.42913402))
            Line((-22.55149134, -60.42913402), (-13.455295606, -30.897330308))
            ThreePointArc((-13.455295606, -30.897330308), (-23.873491848, -23.785423834), (-30.946846706, -13.341014914))
        make_face()
    extrude(amount=-CUT_EXTRUDE_1_DEPTH, mode=Mode.SUBTRACT)

    # 草图6 → 切除-拉伸2 (cut)
    with BuildSketch(Plane(origin=(0, 0, -18), x_dir=(-1, 0, 0), z_dir=(0, 0, -1))):
        Circle(SKETCH_6_R)
    extrude(amount=-CUT_EXTRUDE_2_DEPTH, mode=Mode.SUBTRACT)


solid = part.part
